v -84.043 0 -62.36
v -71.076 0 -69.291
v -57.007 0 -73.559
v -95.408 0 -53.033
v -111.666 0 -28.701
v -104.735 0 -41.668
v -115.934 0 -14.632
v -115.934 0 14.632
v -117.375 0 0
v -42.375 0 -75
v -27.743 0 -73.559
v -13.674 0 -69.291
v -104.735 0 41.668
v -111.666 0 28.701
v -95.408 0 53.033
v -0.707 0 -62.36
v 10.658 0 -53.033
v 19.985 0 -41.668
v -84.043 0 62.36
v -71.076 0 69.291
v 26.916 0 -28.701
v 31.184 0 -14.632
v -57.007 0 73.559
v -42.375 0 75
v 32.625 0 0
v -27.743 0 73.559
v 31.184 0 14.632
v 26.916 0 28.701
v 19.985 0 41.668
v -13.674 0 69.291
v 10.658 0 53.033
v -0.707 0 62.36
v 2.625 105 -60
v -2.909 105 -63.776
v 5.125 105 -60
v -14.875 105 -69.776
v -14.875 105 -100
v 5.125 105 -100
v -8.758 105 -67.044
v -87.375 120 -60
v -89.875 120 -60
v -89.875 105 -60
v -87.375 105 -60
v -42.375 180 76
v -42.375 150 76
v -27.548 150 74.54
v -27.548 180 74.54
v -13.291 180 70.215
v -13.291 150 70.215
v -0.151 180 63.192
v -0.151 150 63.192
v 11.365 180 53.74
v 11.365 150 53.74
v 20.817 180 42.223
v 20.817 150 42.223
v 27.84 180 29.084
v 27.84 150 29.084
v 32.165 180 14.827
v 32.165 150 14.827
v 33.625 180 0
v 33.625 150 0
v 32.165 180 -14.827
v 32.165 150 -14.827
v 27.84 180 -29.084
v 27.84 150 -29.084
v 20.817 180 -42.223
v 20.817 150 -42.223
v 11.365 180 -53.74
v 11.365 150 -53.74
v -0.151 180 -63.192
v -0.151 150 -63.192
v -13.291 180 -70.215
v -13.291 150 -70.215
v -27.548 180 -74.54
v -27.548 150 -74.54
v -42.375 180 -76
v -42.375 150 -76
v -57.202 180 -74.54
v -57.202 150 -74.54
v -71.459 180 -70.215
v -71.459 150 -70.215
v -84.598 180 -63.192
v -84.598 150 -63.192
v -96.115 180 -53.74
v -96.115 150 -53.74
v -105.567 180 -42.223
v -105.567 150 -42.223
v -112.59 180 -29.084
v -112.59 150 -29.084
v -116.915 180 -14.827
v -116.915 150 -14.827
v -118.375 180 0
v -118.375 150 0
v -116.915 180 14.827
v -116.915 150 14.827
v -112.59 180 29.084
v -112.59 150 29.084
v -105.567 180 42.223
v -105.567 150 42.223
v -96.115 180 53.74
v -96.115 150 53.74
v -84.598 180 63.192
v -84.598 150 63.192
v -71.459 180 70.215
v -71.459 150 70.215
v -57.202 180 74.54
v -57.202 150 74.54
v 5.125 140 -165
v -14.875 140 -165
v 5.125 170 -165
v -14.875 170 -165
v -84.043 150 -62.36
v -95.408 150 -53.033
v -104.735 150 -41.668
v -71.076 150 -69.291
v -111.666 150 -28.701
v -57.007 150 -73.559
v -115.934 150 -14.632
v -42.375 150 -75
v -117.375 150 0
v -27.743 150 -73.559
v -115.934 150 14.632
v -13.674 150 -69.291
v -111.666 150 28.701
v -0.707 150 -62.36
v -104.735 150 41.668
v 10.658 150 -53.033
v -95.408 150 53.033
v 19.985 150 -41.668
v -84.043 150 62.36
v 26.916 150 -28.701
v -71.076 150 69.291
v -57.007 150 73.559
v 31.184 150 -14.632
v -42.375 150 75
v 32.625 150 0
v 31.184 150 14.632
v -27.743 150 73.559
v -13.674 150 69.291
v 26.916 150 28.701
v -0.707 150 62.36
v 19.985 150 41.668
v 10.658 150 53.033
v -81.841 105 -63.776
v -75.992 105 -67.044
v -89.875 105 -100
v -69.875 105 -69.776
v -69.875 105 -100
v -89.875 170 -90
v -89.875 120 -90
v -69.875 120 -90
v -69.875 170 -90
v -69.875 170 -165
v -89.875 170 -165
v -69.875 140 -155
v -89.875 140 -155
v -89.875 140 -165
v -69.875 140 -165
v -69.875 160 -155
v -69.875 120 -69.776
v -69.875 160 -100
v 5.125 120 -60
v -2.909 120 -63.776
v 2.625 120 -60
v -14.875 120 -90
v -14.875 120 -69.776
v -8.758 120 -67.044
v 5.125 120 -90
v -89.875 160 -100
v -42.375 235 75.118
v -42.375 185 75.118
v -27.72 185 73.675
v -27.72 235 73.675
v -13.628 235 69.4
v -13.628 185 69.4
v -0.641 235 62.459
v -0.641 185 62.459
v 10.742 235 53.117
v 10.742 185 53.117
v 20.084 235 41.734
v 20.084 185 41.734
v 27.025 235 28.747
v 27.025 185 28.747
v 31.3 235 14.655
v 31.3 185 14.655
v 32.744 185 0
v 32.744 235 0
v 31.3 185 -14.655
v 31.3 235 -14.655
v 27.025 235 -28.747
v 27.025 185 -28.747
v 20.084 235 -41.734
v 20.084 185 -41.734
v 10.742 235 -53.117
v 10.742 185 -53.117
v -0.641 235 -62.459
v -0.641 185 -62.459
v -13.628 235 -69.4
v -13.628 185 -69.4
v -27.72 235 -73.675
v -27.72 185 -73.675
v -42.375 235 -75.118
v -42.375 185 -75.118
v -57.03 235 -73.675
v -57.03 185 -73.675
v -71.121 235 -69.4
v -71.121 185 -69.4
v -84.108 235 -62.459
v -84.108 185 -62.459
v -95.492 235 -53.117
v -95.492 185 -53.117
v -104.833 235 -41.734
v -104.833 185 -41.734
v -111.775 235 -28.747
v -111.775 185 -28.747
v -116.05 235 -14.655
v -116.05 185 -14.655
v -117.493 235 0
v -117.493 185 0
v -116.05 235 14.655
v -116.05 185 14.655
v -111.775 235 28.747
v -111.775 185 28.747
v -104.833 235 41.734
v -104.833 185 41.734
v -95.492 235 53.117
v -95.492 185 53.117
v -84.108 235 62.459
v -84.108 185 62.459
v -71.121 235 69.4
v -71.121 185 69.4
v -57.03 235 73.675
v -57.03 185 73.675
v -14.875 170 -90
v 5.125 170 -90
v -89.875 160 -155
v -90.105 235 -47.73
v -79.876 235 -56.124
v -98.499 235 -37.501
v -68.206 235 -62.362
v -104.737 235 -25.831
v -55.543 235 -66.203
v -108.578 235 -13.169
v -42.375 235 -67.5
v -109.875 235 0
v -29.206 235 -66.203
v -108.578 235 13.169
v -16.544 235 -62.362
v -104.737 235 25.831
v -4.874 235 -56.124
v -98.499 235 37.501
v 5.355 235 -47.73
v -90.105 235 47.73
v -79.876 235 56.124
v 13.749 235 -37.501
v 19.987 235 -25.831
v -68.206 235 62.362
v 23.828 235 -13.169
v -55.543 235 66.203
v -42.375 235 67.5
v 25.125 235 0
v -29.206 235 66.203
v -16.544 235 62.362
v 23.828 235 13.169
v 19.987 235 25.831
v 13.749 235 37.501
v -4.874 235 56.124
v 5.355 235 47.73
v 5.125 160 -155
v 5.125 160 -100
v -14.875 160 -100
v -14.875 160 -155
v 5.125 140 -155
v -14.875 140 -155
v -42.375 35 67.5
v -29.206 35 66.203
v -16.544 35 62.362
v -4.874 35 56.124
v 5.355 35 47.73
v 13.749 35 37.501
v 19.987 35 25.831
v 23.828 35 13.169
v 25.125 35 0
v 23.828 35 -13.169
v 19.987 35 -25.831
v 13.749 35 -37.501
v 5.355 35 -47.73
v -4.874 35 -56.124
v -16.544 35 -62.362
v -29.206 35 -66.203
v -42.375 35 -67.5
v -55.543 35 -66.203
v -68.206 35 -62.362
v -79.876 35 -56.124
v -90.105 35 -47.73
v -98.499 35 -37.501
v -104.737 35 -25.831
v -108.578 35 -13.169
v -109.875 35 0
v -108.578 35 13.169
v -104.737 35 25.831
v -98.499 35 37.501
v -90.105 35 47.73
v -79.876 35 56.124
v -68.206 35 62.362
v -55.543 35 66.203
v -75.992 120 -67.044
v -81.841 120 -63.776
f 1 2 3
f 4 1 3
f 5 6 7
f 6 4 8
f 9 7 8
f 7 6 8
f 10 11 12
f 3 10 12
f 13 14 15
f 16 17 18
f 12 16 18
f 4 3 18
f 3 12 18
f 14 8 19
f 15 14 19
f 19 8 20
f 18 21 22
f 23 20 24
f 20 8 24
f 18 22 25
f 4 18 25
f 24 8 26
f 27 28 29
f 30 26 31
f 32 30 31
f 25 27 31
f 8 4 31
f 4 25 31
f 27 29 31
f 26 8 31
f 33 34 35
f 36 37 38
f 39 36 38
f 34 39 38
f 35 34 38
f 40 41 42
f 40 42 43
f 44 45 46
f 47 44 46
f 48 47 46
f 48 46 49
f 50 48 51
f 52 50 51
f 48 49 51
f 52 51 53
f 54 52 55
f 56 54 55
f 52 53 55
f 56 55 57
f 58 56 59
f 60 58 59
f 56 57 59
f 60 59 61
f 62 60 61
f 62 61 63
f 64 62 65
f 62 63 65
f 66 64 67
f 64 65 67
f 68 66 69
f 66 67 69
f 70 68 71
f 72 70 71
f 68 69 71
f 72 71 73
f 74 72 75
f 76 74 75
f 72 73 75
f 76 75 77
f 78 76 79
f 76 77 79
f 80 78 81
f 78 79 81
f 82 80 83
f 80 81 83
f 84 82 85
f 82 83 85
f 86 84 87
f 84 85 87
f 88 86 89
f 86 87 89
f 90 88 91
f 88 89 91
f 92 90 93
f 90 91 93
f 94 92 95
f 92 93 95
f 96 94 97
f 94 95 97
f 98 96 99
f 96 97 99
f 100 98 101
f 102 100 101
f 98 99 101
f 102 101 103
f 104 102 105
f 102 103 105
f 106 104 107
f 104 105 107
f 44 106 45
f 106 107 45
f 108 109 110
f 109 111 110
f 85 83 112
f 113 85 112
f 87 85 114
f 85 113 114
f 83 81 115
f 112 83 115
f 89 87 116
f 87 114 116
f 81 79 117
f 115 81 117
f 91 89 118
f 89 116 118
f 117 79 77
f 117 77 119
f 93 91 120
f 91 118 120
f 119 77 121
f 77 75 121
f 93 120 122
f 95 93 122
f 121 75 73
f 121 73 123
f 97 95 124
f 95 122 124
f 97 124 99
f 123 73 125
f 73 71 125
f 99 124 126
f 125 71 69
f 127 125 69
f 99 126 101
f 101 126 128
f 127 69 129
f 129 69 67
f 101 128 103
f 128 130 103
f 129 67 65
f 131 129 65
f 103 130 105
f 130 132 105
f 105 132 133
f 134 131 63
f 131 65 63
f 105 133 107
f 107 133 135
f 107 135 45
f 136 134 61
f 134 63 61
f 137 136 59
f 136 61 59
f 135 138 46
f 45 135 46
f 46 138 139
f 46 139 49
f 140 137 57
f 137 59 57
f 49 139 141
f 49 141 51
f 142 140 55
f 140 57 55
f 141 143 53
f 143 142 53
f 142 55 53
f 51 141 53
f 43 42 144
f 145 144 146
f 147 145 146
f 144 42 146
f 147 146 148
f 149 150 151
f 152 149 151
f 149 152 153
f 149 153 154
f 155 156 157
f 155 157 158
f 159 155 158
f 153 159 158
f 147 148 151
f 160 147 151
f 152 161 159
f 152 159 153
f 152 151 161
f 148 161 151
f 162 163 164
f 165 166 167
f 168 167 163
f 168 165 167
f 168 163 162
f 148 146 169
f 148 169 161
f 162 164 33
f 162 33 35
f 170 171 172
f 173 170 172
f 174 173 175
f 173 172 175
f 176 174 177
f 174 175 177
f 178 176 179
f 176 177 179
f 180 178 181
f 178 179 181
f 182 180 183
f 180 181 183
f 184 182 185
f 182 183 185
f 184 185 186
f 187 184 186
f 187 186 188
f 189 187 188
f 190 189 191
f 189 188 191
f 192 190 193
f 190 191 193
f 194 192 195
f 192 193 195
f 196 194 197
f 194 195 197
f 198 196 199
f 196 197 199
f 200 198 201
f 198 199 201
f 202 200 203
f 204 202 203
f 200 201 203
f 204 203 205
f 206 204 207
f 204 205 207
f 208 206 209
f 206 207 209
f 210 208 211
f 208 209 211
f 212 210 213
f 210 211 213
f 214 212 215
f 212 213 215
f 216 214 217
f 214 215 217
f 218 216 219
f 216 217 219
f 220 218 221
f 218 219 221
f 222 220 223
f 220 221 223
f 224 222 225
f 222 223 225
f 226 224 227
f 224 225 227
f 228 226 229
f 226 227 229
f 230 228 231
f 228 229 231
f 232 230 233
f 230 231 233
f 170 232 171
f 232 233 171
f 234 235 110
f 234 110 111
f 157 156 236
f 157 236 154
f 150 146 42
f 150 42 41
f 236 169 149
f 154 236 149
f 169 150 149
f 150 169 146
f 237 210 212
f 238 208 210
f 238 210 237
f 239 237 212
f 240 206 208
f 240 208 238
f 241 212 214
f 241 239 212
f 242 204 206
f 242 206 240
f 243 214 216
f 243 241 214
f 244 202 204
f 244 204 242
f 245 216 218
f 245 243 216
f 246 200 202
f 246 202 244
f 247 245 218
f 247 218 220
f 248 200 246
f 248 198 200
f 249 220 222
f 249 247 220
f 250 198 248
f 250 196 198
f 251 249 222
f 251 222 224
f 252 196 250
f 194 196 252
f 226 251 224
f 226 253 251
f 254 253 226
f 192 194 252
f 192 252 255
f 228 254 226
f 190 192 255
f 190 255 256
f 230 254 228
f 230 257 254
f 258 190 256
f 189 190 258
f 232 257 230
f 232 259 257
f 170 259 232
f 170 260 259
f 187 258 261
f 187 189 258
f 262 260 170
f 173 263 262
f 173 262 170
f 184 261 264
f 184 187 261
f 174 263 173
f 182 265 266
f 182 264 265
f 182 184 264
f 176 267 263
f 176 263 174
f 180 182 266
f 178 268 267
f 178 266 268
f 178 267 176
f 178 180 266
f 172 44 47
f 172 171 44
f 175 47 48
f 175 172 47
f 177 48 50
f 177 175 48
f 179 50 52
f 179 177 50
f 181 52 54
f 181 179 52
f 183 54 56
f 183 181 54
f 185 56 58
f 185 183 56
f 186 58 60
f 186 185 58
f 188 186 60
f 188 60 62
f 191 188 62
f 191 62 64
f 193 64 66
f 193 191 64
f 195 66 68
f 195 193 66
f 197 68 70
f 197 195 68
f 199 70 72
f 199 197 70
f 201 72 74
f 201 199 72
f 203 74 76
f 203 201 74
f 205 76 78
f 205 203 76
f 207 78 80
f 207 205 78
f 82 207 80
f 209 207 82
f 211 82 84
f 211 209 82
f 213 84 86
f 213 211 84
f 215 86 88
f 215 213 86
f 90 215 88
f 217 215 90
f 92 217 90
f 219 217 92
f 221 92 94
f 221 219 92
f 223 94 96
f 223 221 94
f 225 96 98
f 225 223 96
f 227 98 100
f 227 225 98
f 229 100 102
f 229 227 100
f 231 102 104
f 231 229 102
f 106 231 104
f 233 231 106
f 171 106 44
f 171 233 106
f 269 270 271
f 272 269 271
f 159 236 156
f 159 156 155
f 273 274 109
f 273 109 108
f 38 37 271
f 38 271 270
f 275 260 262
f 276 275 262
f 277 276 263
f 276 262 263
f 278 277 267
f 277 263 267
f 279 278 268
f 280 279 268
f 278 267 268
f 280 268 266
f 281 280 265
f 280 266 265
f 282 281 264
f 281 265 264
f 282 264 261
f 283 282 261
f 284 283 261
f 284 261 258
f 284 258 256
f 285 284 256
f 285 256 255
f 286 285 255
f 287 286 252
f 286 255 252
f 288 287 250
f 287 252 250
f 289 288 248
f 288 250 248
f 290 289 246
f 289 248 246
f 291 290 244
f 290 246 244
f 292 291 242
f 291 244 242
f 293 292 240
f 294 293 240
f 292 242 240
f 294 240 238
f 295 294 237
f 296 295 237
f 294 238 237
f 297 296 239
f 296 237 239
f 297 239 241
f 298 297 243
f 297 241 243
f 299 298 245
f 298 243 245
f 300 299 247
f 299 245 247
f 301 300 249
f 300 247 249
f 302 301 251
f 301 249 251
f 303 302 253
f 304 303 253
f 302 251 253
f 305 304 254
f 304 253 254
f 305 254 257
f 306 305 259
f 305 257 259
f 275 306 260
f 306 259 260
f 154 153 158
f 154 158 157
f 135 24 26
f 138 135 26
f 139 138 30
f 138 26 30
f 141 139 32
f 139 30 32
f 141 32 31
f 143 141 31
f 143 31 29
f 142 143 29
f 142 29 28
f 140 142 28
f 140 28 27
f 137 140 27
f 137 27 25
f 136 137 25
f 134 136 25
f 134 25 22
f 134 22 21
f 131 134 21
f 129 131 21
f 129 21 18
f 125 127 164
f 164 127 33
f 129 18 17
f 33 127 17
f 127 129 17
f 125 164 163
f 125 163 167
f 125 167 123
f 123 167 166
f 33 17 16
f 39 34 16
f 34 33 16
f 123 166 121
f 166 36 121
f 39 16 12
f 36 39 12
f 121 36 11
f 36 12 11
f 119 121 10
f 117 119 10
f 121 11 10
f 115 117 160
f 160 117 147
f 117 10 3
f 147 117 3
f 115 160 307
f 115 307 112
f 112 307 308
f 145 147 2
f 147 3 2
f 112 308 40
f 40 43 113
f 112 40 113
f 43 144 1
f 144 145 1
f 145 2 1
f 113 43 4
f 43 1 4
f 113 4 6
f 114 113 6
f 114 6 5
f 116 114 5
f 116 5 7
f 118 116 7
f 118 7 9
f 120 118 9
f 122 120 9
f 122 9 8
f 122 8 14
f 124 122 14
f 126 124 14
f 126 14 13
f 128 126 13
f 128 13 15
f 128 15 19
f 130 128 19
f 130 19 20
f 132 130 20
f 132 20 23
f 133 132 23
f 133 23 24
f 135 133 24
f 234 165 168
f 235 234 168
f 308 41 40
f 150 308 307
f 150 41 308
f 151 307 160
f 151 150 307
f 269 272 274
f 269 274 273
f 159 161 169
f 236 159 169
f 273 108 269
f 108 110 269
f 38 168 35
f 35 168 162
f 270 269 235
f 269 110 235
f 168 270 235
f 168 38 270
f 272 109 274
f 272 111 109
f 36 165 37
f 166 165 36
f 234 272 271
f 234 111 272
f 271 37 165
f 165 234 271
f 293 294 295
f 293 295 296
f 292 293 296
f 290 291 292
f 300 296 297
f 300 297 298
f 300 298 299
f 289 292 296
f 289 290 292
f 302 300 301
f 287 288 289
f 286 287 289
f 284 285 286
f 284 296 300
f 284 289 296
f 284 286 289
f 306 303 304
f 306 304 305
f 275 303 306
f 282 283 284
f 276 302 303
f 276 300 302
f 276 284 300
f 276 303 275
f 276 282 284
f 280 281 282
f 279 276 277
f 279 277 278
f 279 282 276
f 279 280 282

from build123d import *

# Parameters (mm, degrees)
SKETCH1_R                = 75
BOSS_EXTRUDE1_DEPTH      = 150
SKETCH3_R                = 76
BOSS_EXTRUDE3_DEPTH      = 30
SKETCH4_R                = 76
BOSS_EXTRUDE4_DEPTH      = 5
BOSS_EXTRUDE4_TAPER      = 10
SKETCH5_R                = 75.118365096
BOSS_EXTRUDE5_DEPTH      = 50
BOSS_EXTRUDE6_DEPTH      = 20
BOSS_EXTRUDE6_DEPTH_BACK = 20
SKETCH8_W                = 20
SKETCH8_H                = 15
SKETCH9_W                = 20
SKETCH9_H                = 10
BOSS_EXTRUDE7_DEPTH      = 50
SKETCH10_W               = 20
SKETCH10_H               = 10
BOSS_EXTRUDE8_DEPTH      = 65
SKETCH11_W               = 20
SKETCH11_H               = 10
BOSS_EXTRUDE9_DEPTH      = 50
SKETCH12_W               = 20
SKETCH12_H               = 10
BOSS_EXTRUDE10_DEPTH     = 65
SKETCH13_W               = 20
SKETCH13_H               = 10
BOSS_EXTRUDE11_DEPTH     = 20
SKETCH6_R                = 67.5
CUT_EXTRUDE2_DEPTH       = 200


with BuildPart() as part:
    # Sketch1 → Boss-Extrude1 (new body)
    with BuildSketch(Plane(origin=(0, 0, 0), x_dir=(1, 0, 0), z_dir=(0, 1, 0))):
        with Locations((-42.374837203, 0)):
            Circle(SKETCH1_R)
    extrude(amount=BOSS_EXTRUDE1_DEPTH)

    # Sketch3 → Boss-Extrude3 (add)
    with BuildSketch(Plane(origin=(0, 150, 0), x_dir=(1, 0, 0), z_dir=(0, 1, 0))):
        with Locations((-42.374837203, 0)):
            Circle(SKETCH3_R)
    extrude(amount=BOSS_EXTRUDE3_DEPTH)

    # Sketch4 → Boss-Extrude4 (add)
    with BuildSketch(Plane(origin=(0, 180, 0), x_dir=(1, 0, 0), z_dir=(0, 1, 0))):
        with Locations((-42.374837203, 0)):
            Circle(SKETCH4_R)
    extrude(amount=BOSS_EXTRUDE4_DEPTH, taper=BOSS_EXTRUDE4_TAPER)

    # Sketch5 → Boss-Extrude5 (add)
    with BuildSketch(Plane(origin=(0, 185, 0), x_dir=(1, 0, 0), z_dir=(0, 1, 0))):
        with Locations((-42.374837203, 0)):
            Circle(SKETCH5_R)
    extrude(amount=BOSS_EXTRUDE5_DEPTH)

    # Sketch8 → Boss-Extrude6 (add, two sides: drawn at the far end of the back side and taken through both)
    with BuildSketch(Plane.XY.offset(-80).offset(-BOSS_EXTRUDE6_DEPTH_BACK)):
        with Locations((-4.874837203, 112.5)):
            Rectangle(SKETCH8_W, SKETCH8_H)
        with Locations((-79.874837203, 112.5)):
            Rectangle(SKETCH8_W, SKETCH8_H)
    extrude(amount=BOSS_EXTRUDE6_DEPTH + BOSS_EXTRUDE6_DEPTH_BACK)

    # Sketch9 → Boss-Extrude7 (add)
    with BuildSketch(Plane(origin=(0, 120, 0), x_dir=(1, 0, 0), z_dir=(0, 1, 0))):
        with Locations((-4.874837203, 95)):
            Rectangle(SKETCH9_W, SKETCH9_H)
    extrude(amount=BOSS_EXTRUDE7_DEPTH)

    # Sketch10 → Boss-Extrude8 (add)
    with BuildSketch(Plane(origin=(0, 0, -100), x_dir=(-1, 0, 0), z_dir=(0, 0, -1))):
        with Locations((4.874837203, 165)):
            Rectangle(SKETCH10_W, SKETCH10_H)
    extrude(amount=BOSS_EXTRUDE8_DEPTH)

    # Sketch11 → Boss-Extrude9 (add)
    with BuildSketch(Plane(origin=(0, 120, 0), x_dir=(1, 0, 0), z_dir=(0, 1, 0))):
        with Locations((-79.874837203, 95)):
            Rectangle(SKETCH11_W, SKETCH11_H)
    extrude(amount=BOSS_EXTRUDE9_DEPTH)

    # Sketch12 → Boss-Extrude10 (add)
    with BuildSketch(Plane(origin=(0, 0, -100), x_dir=(-1, 0, 0), z_dir=(0, 0, -1))):
        with Locations((79.874837203, 165)):
            Rectangle(SKETCH12_W, SKETCH12_H)
    extrude(amount=BOSS_EXTRUDE10_DEPTH)

    # Sketch13 → Boss-Extrude11 (add)
    with BuildSketch(Plane.XZ.offset(-160)):
        with Locations((-4.874837203, -160)):
            Rectangle(SKETCH13_W, SKETCH13_H)
        with Locations((-79.874837203, -160)):
            Rectangle(SKETCH13_W, SKETCH13_H)
    extrude(amount=BOSS_EXTRUDE11_DEPTH)

    # Sketch6 → Cut-Extrude2 (cut)
    with BuildSketch(Plane(origin=(0, 235, 0), x_dir=(1, 0, 0), z_dir=(0, 1, 0))):
        with Locations((-42.374837203, 0)):
            Circle(SKETCH6_R)
    extrude(amount=-CUT_EXTRUDE2_DEPTH, mode=Mode.SUBTRACT)


solid = part.part
